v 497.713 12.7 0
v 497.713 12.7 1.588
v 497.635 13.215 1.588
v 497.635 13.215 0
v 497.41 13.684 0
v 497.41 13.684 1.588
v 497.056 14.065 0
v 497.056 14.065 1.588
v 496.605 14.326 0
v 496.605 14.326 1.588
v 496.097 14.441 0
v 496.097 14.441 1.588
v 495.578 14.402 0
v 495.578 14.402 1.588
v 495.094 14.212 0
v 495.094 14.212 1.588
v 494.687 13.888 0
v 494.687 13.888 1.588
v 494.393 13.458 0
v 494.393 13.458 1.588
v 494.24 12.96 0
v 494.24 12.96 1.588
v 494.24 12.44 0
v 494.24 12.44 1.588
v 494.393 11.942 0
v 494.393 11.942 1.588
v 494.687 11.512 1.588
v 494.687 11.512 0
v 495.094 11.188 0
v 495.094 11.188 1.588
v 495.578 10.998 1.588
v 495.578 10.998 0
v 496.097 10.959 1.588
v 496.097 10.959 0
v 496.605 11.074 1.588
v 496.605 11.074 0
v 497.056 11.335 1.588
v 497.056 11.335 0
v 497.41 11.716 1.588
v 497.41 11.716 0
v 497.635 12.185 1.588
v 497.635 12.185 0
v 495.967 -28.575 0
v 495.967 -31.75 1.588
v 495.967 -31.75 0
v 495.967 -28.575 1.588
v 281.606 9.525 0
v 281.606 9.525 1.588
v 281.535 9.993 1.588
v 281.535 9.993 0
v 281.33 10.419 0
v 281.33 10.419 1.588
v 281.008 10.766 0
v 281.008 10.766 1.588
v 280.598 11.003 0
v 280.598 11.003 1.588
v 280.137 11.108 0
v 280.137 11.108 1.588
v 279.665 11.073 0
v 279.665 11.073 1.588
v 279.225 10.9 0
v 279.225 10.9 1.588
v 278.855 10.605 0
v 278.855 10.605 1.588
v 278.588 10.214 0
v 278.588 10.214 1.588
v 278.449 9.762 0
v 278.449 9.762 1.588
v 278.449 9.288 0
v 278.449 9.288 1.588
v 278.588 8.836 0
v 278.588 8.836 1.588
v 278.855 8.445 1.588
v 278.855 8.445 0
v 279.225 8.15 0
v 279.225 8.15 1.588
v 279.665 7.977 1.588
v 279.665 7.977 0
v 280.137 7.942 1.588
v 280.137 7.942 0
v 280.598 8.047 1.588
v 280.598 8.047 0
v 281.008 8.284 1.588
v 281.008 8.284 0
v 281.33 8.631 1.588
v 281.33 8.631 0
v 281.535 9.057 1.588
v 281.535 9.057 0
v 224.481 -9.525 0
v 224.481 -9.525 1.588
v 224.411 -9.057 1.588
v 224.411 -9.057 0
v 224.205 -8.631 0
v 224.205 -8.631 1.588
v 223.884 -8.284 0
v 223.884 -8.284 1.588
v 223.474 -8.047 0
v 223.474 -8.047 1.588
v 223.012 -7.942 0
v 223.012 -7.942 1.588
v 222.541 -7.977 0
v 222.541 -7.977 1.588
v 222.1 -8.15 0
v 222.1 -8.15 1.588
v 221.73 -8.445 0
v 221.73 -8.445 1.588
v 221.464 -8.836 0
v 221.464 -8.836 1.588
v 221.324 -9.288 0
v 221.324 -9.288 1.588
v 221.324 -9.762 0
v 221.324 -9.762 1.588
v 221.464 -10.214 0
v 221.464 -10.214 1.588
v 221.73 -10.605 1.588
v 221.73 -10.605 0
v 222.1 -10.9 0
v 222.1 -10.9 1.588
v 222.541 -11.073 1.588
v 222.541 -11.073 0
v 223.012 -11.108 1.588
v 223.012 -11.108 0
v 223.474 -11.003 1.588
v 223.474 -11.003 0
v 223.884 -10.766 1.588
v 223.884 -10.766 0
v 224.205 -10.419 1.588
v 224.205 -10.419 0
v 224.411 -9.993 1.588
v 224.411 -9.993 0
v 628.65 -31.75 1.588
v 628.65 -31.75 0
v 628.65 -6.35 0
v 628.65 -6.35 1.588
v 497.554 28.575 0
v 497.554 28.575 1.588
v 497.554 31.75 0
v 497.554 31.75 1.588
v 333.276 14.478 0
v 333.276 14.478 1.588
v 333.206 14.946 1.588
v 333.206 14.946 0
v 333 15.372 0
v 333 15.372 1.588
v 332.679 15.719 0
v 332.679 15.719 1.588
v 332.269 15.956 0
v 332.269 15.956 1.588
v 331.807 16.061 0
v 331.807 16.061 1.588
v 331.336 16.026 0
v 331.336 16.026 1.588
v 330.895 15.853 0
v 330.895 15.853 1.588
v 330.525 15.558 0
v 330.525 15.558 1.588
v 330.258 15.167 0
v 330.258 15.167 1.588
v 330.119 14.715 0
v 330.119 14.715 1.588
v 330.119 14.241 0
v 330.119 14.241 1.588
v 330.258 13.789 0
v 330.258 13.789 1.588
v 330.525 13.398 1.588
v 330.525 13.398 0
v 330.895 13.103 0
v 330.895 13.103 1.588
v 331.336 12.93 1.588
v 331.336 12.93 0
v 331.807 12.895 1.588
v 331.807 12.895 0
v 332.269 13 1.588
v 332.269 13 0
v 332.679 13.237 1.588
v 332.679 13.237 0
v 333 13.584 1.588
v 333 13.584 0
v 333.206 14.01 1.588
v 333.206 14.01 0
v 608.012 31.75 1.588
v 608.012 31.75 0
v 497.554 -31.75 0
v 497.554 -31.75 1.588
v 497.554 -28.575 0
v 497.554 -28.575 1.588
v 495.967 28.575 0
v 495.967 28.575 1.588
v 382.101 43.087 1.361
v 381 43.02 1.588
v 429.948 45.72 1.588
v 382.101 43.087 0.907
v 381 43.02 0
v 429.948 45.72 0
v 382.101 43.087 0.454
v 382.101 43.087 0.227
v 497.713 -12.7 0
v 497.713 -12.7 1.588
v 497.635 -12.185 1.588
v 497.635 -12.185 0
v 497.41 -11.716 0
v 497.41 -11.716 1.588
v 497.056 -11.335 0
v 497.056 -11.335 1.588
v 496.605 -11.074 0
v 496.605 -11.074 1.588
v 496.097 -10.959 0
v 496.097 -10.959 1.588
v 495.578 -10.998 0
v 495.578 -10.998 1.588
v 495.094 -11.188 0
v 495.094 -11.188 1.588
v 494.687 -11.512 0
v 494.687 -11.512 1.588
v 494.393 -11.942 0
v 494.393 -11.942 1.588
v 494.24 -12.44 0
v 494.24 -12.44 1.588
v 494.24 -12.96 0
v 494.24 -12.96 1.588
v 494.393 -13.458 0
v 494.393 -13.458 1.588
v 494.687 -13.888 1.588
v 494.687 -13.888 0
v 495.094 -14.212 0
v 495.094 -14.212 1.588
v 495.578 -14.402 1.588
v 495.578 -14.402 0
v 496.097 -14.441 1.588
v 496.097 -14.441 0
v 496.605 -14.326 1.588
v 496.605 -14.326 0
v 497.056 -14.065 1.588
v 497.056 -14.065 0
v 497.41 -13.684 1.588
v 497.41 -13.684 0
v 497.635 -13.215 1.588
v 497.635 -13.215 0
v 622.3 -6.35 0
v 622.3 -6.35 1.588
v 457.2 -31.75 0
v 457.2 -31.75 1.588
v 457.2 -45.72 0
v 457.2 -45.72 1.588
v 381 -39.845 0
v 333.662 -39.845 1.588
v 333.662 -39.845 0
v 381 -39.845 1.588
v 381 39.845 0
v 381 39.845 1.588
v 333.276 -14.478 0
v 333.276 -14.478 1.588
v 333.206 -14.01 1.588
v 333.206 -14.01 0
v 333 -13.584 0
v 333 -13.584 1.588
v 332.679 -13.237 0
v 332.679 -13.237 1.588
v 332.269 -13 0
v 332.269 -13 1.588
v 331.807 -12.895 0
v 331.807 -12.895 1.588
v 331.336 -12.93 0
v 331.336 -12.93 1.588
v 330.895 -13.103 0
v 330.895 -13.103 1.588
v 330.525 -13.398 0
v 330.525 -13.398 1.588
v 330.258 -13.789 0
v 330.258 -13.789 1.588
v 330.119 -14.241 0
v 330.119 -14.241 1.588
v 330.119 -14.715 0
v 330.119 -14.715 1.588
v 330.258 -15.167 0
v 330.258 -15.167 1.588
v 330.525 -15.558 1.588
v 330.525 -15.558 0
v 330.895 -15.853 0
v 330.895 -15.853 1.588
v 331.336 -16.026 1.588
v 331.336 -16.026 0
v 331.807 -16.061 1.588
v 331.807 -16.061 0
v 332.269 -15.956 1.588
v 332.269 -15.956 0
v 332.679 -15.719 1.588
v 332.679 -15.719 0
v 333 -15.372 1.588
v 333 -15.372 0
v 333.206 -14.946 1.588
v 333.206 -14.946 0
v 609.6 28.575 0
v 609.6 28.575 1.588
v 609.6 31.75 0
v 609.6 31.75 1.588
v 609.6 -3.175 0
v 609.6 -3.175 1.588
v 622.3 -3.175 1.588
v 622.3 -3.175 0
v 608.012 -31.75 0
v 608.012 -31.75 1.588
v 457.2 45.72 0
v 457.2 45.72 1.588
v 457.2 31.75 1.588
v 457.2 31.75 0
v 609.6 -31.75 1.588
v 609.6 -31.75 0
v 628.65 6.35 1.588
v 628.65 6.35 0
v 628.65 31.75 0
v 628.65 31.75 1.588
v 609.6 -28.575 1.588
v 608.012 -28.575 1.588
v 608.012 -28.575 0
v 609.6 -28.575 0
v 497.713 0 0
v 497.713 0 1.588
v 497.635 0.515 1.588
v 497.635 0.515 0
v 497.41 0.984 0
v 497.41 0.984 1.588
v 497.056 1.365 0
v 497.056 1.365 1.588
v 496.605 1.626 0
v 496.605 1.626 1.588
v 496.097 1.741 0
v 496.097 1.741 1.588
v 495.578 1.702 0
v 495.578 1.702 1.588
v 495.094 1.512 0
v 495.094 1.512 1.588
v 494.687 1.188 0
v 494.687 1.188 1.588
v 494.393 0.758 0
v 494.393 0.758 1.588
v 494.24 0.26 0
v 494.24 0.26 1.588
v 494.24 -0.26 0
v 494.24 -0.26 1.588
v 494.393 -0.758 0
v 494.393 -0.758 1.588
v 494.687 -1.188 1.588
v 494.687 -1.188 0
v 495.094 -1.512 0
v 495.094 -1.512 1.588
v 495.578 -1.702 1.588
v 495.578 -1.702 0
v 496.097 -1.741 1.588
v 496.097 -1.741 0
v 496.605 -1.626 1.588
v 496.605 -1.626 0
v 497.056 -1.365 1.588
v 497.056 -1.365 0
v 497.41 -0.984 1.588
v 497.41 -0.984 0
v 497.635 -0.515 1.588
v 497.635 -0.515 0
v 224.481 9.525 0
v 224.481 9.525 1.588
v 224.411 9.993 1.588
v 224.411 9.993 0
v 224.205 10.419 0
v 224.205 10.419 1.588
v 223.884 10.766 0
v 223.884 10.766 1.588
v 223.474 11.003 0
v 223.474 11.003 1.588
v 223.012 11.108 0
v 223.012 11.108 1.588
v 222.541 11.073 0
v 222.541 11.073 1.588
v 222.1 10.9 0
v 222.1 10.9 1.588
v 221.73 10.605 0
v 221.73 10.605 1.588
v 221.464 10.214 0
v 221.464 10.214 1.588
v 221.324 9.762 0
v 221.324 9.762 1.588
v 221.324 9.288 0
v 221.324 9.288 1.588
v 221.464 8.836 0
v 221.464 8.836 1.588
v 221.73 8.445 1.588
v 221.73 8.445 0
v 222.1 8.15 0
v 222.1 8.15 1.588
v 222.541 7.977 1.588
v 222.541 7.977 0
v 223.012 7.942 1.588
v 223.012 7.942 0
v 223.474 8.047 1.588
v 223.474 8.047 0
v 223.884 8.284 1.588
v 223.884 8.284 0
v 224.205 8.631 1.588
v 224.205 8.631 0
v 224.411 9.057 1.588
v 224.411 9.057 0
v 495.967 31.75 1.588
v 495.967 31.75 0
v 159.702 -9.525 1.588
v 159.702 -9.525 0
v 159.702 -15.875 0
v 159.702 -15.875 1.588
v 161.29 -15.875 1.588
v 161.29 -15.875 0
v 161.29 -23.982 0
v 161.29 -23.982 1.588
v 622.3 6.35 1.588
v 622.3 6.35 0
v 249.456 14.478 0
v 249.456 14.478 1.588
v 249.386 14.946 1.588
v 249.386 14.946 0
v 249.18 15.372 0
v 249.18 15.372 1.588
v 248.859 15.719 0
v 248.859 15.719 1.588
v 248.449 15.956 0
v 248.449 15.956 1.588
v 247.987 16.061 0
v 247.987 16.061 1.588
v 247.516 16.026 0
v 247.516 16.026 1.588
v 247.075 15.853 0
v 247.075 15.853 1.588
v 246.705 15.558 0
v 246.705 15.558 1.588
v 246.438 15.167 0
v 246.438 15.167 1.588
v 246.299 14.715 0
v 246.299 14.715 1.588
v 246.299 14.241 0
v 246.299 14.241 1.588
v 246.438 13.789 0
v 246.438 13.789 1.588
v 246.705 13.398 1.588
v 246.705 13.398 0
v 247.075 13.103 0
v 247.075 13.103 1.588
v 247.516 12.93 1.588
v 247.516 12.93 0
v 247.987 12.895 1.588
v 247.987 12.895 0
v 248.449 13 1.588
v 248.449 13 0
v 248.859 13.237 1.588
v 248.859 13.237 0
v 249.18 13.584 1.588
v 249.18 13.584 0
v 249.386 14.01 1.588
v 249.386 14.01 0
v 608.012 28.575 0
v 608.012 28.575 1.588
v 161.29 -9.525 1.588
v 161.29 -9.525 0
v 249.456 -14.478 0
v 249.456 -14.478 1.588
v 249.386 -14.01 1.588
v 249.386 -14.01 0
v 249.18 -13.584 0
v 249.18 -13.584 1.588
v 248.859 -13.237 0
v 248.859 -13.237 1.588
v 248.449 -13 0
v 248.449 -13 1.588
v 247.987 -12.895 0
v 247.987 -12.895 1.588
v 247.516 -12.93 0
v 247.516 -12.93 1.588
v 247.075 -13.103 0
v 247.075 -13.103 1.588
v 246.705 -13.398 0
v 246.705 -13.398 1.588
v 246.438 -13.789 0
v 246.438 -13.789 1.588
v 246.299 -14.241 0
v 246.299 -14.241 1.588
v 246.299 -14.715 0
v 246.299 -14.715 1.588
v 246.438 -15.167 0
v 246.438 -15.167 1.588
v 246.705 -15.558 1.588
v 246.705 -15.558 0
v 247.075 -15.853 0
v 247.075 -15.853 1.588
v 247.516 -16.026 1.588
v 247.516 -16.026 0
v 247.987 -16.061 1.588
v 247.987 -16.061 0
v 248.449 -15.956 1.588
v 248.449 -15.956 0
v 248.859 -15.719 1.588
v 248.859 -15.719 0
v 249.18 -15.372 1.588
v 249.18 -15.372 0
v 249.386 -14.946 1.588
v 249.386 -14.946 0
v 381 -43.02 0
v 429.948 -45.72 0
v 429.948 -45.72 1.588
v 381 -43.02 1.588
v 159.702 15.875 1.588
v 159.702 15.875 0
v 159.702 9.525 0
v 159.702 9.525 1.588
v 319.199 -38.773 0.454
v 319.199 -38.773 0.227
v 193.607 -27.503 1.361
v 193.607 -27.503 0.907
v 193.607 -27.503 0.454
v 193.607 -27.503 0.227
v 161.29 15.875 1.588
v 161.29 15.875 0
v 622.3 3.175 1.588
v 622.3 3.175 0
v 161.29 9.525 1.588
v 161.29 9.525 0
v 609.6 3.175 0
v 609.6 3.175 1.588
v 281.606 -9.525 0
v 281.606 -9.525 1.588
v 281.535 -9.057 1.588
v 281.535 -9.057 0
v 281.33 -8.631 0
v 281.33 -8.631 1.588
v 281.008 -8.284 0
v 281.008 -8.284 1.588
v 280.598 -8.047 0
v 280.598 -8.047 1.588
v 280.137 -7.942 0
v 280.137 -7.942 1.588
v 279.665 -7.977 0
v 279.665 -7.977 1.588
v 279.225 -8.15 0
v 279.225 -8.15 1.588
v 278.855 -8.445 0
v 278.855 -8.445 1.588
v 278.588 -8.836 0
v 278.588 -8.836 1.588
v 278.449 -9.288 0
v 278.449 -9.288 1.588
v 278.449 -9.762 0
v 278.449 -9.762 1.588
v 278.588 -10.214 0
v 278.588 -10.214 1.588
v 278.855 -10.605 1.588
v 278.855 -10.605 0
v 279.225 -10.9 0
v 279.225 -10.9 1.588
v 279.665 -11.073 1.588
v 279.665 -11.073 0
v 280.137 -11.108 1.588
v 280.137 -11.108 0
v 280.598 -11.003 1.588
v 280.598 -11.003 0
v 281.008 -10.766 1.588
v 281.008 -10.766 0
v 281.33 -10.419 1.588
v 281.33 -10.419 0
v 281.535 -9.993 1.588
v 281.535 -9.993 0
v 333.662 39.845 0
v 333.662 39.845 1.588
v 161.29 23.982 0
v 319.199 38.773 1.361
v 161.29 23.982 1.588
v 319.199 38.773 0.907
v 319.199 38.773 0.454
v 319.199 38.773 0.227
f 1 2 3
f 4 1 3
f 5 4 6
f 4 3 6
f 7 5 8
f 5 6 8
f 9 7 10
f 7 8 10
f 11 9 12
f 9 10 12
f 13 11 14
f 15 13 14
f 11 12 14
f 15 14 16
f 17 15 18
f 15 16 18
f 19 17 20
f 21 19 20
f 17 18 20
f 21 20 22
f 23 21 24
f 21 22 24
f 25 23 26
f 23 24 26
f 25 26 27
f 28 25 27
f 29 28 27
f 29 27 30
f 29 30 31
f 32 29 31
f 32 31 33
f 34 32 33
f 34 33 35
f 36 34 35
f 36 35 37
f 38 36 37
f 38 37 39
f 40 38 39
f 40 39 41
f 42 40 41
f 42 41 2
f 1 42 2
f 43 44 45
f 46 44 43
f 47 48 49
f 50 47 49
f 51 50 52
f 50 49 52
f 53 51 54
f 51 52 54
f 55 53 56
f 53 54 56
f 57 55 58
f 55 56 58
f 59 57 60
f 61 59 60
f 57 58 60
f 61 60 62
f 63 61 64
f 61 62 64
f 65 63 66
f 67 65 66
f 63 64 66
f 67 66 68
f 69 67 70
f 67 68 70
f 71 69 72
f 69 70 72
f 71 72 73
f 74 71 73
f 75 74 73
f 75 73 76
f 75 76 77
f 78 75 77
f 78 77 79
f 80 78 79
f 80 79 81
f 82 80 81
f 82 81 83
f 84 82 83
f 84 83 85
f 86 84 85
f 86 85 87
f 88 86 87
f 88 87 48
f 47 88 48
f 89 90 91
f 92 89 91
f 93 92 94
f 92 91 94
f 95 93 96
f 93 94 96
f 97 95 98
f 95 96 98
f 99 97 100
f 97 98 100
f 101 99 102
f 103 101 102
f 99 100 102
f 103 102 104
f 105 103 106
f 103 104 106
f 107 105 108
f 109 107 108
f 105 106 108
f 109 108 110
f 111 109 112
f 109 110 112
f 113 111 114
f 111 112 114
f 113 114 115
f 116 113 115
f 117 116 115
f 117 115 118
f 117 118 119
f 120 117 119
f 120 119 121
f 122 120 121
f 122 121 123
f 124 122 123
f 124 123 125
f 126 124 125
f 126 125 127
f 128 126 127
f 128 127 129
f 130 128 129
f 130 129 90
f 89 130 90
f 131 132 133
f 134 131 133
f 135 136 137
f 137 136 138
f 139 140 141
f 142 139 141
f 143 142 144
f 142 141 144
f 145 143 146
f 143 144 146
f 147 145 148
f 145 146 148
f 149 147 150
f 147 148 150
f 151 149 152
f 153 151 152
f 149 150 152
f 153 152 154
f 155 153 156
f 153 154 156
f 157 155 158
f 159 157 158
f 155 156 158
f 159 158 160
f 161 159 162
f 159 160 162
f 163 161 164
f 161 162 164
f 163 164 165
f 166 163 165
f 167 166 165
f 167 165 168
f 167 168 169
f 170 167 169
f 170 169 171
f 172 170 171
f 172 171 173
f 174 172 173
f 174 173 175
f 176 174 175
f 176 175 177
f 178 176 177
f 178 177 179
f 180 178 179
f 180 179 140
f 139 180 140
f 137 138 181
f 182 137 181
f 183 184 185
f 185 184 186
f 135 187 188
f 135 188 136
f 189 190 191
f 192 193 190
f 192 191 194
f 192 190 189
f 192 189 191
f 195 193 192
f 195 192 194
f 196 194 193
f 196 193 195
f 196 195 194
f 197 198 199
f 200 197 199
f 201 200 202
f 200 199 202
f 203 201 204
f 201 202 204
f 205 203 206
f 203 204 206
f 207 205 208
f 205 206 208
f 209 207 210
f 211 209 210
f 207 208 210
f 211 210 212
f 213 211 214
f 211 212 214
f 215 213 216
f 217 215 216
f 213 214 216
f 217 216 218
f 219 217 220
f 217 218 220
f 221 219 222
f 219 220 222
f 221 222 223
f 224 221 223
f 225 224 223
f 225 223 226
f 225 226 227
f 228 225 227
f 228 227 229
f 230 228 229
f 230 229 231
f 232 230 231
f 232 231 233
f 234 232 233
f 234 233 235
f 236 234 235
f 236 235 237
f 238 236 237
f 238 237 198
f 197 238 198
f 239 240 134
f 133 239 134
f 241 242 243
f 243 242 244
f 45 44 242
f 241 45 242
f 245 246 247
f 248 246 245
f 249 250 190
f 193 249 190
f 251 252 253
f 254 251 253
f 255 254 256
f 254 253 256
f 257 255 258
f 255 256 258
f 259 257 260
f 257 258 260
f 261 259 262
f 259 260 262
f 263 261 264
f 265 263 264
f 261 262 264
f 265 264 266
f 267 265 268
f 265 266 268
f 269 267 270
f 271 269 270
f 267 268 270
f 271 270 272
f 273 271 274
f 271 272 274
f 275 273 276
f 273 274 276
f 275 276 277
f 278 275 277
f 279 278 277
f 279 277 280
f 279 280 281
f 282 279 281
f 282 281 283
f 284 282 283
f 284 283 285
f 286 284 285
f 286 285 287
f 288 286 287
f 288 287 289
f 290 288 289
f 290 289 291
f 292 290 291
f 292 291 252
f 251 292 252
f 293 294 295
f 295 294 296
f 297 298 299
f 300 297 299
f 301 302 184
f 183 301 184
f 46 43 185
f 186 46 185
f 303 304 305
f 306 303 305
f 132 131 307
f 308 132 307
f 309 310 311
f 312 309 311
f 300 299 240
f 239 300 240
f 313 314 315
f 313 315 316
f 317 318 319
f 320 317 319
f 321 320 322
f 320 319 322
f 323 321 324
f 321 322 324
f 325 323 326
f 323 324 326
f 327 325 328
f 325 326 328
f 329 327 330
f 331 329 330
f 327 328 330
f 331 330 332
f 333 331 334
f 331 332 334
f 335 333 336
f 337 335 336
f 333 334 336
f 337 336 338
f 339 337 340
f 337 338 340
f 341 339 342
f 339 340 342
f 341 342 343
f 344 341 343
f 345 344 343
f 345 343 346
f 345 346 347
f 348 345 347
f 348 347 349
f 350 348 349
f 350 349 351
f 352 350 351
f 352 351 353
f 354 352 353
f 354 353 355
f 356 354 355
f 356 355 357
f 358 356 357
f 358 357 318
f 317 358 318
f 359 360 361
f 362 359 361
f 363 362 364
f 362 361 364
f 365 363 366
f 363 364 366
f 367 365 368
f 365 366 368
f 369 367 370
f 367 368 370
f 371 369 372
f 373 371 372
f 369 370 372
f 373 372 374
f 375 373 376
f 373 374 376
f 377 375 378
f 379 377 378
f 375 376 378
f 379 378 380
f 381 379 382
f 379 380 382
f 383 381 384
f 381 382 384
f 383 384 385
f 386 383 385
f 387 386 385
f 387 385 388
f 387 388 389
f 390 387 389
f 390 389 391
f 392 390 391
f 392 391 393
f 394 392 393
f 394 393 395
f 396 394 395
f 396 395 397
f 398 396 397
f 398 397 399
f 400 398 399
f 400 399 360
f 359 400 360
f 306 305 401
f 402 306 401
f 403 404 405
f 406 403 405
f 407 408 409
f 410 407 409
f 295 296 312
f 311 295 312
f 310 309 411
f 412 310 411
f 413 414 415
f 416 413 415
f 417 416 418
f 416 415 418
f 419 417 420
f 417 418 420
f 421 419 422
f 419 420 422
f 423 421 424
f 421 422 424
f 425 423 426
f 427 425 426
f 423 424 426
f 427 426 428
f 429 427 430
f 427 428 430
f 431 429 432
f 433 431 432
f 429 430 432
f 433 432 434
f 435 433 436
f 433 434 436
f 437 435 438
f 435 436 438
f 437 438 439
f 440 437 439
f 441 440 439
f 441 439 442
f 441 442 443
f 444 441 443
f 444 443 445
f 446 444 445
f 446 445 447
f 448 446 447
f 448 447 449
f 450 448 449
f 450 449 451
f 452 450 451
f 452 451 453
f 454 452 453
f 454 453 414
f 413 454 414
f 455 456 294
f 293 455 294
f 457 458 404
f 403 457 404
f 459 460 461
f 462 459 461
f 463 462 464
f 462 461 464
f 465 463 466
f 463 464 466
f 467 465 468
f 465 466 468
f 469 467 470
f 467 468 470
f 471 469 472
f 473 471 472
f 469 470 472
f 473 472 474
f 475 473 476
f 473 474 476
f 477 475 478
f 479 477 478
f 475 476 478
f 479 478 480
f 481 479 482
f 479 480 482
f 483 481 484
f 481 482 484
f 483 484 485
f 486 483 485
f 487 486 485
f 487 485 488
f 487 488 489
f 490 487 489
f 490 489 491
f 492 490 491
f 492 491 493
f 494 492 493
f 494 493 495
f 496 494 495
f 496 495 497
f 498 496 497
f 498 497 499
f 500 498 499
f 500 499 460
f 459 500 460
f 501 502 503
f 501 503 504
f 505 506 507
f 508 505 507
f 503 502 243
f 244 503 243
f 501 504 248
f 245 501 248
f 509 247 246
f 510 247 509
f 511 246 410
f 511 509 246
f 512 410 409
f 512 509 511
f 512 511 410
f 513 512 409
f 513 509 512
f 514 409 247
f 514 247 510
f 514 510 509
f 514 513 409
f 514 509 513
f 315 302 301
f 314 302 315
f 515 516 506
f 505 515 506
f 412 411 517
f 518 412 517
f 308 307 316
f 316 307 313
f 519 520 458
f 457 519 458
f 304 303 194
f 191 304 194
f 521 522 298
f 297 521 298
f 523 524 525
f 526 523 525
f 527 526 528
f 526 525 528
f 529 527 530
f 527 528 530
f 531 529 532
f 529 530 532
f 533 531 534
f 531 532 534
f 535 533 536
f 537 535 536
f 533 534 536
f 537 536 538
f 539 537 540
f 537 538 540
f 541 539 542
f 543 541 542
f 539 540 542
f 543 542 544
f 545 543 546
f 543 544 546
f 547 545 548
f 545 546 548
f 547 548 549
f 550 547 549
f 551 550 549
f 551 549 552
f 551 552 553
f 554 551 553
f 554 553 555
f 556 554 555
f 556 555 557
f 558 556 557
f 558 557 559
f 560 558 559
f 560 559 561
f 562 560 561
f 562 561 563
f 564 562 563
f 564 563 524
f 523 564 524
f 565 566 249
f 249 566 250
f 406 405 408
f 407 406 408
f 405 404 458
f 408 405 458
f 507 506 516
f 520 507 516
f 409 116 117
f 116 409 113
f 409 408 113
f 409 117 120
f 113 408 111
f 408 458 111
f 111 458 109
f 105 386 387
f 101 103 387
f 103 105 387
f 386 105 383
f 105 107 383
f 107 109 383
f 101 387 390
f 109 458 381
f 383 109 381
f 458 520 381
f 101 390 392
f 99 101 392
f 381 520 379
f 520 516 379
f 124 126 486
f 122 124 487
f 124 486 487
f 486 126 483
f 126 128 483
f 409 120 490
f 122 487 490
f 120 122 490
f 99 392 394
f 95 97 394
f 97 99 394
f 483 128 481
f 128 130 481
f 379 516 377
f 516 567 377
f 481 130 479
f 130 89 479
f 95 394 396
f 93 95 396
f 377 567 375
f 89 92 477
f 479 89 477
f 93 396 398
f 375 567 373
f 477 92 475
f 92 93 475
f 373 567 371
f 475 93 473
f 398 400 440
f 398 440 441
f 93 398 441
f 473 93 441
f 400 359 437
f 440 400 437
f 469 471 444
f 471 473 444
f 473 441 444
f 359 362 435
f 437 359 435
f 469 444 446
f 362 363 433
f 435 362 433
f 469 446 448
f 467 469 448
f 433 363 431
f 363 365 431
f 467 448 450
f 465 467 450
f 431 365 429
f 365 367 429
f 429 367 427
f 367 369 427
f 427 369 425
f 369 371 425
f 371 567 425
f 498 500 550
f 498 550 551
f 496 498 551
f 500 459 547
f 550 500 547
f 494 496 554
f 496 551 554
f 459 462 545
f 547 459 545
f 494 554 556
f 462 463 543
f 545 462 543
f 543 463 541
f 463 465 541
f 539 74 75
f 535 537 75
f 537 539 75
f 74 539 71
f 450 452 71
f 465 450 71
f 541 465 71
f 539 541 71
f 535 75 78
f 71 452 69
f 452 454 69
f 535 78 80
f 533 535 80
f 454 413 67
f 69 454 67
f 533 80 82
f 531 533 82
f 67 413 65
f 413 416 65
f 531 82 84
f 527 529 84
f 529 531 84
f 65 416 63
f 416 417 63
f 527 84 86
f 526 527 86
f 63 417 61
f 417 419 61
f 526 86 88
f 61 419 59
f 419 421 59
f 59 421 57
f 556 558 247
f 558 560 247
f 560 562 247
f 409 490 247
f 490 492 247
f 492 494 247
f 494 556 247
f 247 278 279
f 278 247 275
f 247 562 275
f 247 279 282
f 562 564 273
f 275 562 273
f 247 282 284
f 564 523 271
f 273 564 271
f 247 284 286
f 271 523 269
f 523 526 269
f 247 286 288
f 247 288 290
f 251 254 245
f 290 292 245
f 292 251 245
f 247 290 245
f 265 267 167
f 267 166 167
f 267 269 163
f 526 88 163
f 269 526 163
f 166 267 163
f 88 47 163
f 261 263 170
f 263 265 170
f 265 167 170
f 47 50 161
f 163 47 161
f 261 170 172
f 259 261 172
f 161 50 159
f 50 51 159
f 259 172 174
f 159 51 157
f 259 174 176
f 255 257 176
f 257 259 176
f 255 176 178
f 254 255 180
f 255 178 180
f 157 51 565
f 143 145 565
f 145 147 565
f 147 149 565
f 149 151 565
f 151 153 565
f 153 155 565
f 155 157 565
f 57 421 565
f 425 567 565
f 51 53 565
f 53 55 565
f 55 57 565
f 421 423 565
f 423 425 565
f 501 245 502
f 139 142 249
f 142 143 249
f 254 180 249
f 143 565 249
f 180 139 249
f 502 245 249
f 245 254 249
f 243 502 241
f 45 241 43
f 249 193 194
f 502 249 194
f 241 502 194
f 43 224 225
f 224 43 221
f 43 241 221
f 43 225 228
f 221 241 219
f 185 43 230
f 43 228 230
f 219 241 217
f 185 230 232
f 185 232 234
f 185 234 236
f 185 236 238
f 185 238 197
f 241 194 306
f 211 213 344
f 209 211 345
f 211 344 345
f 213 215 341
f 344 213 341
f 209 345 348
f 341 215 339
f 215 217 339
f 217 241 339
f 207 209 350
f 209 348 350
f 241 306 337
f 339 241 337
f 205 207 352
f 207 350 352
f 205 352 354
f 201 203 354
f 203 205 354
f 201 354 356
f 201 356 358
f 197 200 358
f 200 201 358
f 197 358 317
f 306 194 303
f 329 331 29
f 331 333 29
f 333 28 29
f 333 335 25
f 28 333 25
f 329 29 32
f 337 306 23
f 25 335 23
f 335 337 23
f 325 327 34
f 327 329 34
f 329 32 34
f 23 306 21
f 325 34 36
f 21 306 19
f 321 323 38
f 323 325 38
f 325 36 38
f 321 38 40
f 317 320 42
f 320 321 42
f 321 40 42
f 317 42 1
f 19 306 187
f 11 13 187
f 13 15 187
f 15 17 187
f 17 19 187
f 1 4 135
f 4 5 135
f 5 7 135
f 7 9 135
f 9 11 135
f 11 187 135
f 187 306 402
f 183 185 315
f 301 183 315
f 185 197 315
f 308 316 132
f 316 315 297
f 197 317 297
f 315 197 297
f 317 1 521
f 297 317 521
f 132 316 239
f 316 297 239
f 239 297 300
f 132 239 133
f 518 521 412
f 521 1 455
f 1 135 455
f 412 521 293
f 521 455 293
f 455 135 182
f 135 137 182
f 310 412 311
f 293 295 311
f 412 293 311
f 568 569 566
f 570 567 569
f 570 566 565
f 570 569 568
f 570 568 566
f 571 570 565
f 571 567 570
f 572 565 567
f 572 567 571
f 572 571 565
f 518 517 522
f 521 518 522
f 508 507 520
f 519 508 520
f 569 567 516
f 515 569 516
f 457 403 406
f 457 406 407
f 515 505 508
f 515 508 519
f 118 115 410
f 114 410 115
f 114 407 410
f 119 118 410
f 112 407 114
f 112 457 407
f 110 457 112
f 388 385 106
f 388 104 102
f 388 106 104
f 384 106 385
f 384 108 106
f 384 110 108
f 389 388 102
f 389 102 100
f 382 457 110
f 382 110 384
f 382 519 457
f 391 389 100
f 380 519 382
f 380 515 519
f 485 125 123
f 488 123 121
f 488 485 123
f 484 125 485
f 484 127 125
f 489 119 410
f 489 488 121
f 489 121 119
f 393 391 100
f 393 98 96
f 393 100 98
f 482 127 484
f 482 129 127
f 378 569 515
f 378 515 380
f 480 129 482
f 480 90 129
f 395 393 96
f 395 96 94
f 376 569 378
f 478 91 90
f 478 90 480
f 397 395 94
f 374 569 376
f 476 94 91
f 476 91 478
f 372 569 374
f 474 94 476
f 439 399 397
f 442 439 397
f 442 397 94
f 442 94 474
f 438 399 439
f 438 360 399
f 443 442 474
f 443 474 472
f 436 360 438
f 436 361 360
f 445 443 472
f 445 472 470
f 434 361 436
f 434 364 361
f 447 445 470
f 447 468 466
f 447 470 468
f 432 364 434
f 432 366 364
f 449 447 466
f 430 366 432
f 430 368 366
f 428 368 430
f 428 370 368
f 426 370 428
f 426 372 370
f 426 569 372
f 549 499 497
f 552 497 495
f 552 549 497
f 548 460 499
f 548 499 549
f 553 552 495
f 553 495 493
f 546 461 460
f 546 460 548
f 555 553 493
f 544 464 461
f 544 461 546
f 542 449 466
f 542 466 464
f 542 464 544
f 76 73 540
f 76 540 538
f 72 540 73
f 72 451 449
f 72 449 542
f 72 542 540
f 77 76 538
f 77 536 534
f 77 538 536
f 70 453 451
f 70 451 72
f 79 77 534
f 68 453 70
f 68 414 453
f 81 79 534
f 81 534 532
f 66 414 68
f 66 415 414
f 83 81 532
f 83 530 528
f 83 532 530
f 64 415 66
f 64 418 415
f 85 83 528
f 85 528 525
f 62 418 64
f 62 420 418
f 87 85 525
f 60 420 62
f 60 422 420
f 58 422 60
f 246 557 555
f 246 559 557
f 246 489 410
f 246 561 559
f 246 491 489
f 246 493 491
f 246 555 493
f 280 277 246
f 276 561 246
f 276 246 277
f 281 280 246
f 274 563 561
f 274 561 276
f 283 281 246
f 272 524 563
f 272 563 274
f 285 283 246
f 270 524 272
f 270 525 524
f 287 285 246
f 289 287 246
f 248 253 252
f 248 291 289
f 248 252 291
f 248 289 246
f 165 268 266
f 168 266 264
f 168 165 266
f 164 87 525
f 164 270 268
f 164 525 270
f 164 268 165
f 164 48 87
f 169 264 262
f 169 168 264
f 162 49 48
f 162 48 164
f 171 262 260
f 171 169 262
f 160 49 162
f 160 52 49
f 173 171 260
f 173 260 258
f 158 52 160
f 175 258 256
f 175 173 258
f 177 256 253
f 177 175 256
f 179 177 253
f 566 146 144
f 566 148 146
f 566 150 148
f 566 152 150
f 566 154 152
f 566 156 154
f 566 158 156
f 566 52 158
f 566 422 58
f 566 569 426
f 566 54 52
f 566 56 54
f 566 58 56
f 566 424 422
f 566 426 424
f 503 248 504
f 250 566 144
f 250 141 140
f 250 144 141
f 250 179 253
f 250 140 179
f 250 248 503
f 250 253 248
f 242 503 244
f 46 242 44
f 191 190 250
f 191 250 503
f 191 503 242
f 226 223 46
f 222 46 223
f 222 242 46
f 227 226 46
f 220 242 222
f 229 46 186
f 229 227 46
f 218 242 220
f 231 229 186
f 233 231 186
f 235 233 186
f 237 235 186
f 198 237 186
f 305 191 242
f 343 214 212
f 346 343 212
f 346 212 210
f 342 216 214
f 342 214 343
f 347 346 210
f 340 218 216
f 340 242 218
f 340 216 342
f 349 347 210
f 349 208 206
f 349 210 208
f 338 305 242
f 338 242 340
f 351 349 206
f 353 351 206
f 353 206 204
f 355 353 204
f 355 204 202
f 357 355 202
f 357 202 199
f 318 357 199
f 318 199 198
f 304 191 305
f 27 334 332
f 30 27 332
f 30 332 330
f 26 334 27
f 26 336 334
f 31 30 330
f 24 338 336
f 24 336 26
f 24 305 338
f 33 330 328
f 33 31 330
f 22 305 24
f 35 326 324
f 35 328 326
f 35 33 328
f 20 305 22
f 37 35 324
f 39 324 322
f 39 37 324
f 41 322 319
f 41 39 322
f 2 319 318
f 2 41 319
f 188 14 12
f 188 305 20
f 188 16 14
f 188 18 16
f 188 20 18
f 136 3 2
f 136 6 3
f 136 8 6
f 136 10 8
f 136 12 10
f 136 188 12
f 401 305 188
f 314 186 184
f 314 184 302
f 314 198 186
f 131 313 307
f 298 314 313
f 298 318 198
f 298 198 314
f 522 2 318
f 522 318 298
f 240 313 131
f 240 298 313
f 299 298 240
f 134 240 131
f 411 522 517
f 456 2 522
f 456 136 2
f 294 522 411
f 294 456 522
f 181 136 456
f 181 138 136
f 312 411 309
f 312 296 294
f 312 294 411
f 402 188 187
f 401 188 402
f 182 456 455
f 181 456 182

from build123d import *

# Parameters (mm, degrees)
BOSS_EXTRUDE1_DEPTH    = 1.5875
SKETCH10_W             = 6.35
SKETCH10_H             = 68.58
CUT_EXTRUDE5_DEPTH     = 637.645771754
CUT_EXTRUDE1_DEPTH     = 631.312352085
SKETCH4_W              = 1.5875
SKETCH4_H              = 3.175
CUT_EXTRUDE2_DEPTH     = 631.312352085
SKETCH6_W              = 47.338109293
SKETCH6_H              = 3.175
CUT_EXTRUDE3_DEPTH     = 631.312352085
SKETCH7_R              = 1.5875
ARTS4_MOUNT_DEPTH      = 631.312352085
SKETCH8_R              = 1.5875
TELEMETRUM_MOUNT_DEPTH = 631.312352085
SKETCH9_R              = 1.74625
CUT_EXTRUDE4_DEPTH     = 631.312352085


with BuildPart() as part:
    # Sketch1 → Boss-Extrude1 (new body)
    with BuildSketch(Plane.XY):
        with BuildLine():
            Line((508, -45.72), (508, -34.29))
            Line((508, -34.29), (635, -34.29))
            Line((635, -34.29), (635, 34.29))
            Line((635, 34.29), (508, 34.29))
            Line((508, 34.29), (508, 45.72))
            Line((508, 45.72), (429.947642932, 45.72))
            add(Edge.make_bspline(
                [(161.29, 23.981640211), (161.616784041, 24.018741883), (172.383373415, 25.239568053), (204.048179593, 28.679227521), (256.348102033, 33.727983978), (319.188209115, 38.915614913), (371.60802888, 42.52482202), (408.536828327, 44.644949518), (424.488578703, 45.455997775), (429.947642932, 45.72)],
                knots=[0.31962734, 0.31962734, 0.31962734, 0.31962734, 0.321557959, 0.383234508, 0.506587607, 0.629940705, 0.753293803, 0.814970352, 0.847054623, 0.847054623, 0.847054623, 0.847054623], degree=3))
            Line((161.29, 23.981640211), (161.29, 15.875))
            Line((161.29, 15.875), (159.7025, 15.875))
            Line((159.7025, 15.875), (159.7025, 9.525))
            Line((159.7025, 9.525), (161.29, 9.525))
            Line((161.29, 9.525), (161.29, -9.525))
            Line((161.29, -9.525), (159.7025, -9.525))
            Line((159.7025, -9.525), (159.7025, -15.875))
            Line((159.7025, -15.875), (161.29, -15.875))
            Line((161.29, -15.875), (161.29, -23.981640211))
            add(Edge.make_bspline(
                [(429.947642932, -45.72), (424.488578703, -45.455997775), (408.536828327, -44.644949518), (371.60802888, -42.52482202), (319.188209115, -38.915614913), (256.348102033, -33.727983978), (204.048179593, -28.679227521), (172.383373415, -25.239568053), (161.616784041, -24.018741883), (161.29, -23.981640211)],
                knots=[0.16612059, 0.16612059, 0.16612059, 0.16612059, 0.198204861, 0.25988141, 0.383234508, 0.506587607, 0.629940705, 0.691617254, 0.693547873, 0.693547873, 0.693547873, 0.693547873], degree=3))
            Line((429.947642932, -45.72), (508, -45.72))
        make_face()
    extrude(amount=BOSS_EXTRUDE1_DEPTH)

    # Sketch10 → Cut-Extrude5 (cut, through all)
    with BuildSketch(Plane(origin=(0, 0, 0), x_dir=(-1, 0, 0), z_dir=(0, 0, -1))):
        with Locations((-631.825, 0)):
            Rectangle(SKETCH10_W, SKETCH10_H)
    extrude(amount=-CUT_EXTRUDE5_DEPTH, mode=Mode.SUBTRACT)

    # Sketch3 → Cut-Extrude1 (cut, through all)
    with BuildSketch(Plane.XY.offset(1.5875)):
        Polygon((635, 34.29), (508, 34.29), (508, 45.72), (457.2, 45.72), (457.2, 31.75), (635, 31.75), align=None)
        Polygon((508, -45.72), (508, -34.29), (635, -34.29), (635, -31.75), (457.2, -31.75), (457.2, -45.72), align=None)
        Polygon((622.3, 6.35), (622.3, 3.175), (609.6, 3.175), (609.6, -3.175), (622.3, -3.175), (622.3, -6.35), (628.65, -6.35), (628.65, 6.35), align=None)
    extrude(amount=-CUT_EXTRUDE1_DEPTH, mode=Mode.SUBTRACT)

    # Sketch4 → Cut-Extrude2 (cut, through all)
    with BuildSketch(Plane.XY.offset(1.5875)):
        with Locations((496.7605, 30.1625)):
            Rectangle(SKETCH4_W, SKETCH4_H)
        with Locations((608.80625, 30.1625)):
            Rectangle(SKETCH4_W, SKETCH4_H)
        with Locations((496.7605, -30.1625)):
            Rectangle(SKETCH4_W, SKETCH4_H)
        with Locations((608.80625, -30.1625)):
            Rectangle(SKETCH4_W, SKETCH4_H)
    extrude(amount=-CUT_EXTRUDE2_DEPTH, mode=Mode.SUBTRACT)

    # Sketch6 → Cut-Extrude3 (cut, through all)
    with BuildSketch(Plane.XY.offset(1.5875)):
        with Locations((357.330945353, 41.432202354)):
            Rectangle(SKETCH6_W, SKETCH6_H)
        with Locations((357.330945353, -41.432202354)):
            Rectangle(SKETCH6_W, SKETCH6_H)
    extrude(amount=-CUT_EXTRUDE3_DEPTH, mode=Mode.SUBTRACT)

    # Sketch7 → ARTS4 mount (cut, through all)
    with BuildSketch(Plane.XY.offset(1.5875)):
        with Locations((331.688780886, 14.478)):
            Circle(SKETCH7_R)
        with Locations((331.688780886, -14.478)):
            Circle(SKETCH7_R)
        with Locations((247.868780886, 14.478)):
            Circle(SKETCH7_R)
        with Locations((247.868780886, -14.478)):
            Circle(SKETCH7_R)
    extrude(amount=-ARTS4_MOUNT_DEPTH, mode=Mode.SUBTRACT)

    # Sketch8 → Telemetrum Mount (cut, through all)
    with BuildSketch(Plane.XY.offset(1.5875)):
        with Locations((280.018433255, 9.525)):
            Circle(SKETCH8_R)
        with Locations((280.018433255, -9.525)):
            Circle(SKETCH8_R)
        with Locations((222.893833255, -9.525)):
            Circle(SKETCH8_R)
        with Locations((222.893833255, 9.525)):
            Circle(SKETCH8_R)
    extrude(amount=-TELEMETRUM_MOUNT_DEPTH, mode=Mode.SUBTRACT)

    # Sketch9 → Cut-Extrude4 (cut, through all)
    with BuildSketch(Plane.XY.offset(1.5875)):
        with Locations((495.96675, -12.7)):
            Circle(SKETCH9_R)
        with Locations((495.96675, 12.7)):
            Circle(SKETCH9_R)
        with Locations((495.96675, 0)):
            Circle(SKETCH9_R)
    extrude(amount=-CUT_EXTRUDE4_DEPTH, mode=Mode.SUBTRACT)


solid = part.part
